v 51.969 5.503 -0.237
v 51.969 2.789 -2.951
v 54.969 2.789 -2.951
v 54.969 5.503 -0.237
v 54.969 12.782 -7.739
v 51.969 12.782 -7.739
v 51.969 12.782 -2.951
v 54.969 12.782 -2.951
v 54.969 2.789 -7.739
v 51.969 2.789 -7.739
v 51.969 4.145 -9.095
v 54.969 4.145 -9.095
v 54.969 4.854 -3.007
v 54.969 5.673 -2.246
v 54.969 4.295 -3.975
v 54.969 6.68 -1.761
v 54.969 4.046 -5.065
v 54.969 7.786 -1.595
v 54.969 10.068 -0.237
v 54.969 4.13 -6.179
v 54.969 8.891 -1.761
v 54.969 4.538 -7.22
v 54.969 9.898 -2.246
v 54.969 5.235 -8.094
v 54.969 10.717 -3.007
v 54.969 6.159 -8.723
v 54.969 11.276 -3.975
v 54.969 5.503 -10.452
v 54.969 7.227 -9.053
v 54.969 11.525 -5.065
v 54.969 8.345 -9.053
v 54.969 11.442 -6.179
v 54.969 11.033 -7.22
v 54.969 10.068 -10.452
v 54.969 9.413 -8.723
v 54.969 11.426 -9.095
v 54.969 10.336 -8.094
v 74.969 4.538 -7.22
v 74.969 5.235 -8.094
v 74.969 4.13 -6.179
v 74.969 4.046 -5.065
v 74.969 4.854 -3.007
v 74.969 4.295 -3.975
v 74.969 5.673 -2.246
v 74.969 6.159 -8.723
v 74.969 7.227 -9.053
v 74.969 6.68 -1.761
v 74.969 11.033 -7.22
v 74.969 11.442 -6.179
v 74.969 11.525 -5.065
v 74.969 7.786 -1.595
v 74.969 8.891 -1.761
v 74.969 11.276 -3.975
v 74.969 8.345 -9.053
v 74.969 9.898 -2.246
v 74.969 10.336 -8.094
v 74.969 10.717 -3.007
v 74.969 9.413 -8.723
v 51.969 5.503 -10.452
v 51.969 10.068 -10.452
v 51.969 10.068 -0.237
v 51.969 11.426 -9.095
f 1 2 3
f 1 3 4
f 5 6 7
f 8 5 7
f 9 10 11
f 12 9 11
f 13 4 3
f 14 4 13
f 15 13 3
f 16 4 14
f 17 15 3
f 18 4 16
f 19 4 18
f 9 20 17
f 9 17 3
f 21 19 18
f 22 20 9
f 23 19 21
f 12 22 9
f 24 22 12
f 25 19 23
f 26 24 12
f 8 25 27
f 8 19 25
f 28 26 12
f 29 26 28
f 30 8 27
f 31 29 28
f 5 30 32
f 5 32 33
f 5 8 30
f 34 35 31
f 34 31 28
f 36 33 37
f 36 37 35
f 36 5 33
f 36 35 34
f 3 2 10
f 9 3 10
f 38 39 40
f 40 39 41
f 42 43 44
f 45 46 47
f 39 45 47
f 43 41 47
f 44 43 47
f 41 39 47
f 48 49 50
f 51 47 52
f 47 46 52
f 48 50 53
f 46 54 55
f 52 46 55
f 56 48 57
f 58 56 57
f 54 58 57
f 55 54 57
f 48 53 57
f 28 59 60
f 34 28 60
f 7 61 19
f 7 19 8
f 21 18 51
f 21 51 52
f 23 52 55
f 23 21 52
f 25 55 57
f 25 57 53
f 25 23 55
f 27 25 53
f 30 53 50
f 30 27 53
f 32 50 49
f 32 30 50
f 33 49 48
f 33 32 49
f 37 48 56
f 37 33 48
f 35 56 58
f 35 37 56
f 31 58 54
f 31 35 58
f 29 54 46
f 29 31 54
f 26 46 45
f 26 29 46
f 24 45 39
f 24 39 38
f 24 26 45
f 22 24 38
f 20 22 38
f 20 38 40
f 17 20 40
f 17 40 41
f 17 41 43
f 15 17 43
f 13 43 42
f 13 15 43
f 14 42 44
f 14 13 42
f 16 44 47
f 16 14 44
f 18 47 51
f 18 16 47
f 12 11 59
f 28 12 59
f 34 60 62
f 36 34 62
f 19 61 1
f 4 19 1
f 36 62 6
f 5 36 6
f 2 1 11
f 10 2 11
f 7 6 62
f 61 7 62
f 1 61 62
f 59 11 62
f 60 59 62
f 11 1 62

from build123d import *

# Parameters (mm, degrees)
SKETCH1_R                = 3.75
BOSS_EXTRUDE1_DEPTH      = 14
BOSS_EXTRUDE1_DEPTH_BACK = 9
BOSS_EXTRUDE2_DEPTH      = 3


with BuildPart() as part:
    # Sketch1 → Boss-Extrude1 (new body, two sides)
    with BuildSketch(Plane.ZY.offset(-65.969208633)) as boss_extrude1_sk:
        with Locations((-5.344766421, 7.785620452)):
            Circle(SKETCH1_R)
    extrude(amount=BOSS_EXTRUDE1_DEPTH)
    extrude(boss_extrude1_sk.sketch, amount=-BOSS_EXTRUDE1_DEPTH_BACK)

    # Sketch2 → Boss-Extrude2 (add)
    with BuildSketch(Plane.ZY.offset(-51.969208633)):
        Polygon((-9.094766421, 11.42591126), (-7.738890169, 12.781787511), (-2.950642672, 12.781787511), (-1.594766421, 11.42591126), (-0.237121401, 10.06826624), (-0.237121401, 5.502974665), (-1.594766421, 4.145329645), (-2.950642672, 2.789453394), (-7.738890169, 2.789453394), (-9.094766421, 4.145329645), (-10.45241144, 5.502974665), (-10.45241144, 10.06826624), align=None)
    extrude(amount=-BOSS_EXTRUDE2_DEPTH)


solid = part.part
